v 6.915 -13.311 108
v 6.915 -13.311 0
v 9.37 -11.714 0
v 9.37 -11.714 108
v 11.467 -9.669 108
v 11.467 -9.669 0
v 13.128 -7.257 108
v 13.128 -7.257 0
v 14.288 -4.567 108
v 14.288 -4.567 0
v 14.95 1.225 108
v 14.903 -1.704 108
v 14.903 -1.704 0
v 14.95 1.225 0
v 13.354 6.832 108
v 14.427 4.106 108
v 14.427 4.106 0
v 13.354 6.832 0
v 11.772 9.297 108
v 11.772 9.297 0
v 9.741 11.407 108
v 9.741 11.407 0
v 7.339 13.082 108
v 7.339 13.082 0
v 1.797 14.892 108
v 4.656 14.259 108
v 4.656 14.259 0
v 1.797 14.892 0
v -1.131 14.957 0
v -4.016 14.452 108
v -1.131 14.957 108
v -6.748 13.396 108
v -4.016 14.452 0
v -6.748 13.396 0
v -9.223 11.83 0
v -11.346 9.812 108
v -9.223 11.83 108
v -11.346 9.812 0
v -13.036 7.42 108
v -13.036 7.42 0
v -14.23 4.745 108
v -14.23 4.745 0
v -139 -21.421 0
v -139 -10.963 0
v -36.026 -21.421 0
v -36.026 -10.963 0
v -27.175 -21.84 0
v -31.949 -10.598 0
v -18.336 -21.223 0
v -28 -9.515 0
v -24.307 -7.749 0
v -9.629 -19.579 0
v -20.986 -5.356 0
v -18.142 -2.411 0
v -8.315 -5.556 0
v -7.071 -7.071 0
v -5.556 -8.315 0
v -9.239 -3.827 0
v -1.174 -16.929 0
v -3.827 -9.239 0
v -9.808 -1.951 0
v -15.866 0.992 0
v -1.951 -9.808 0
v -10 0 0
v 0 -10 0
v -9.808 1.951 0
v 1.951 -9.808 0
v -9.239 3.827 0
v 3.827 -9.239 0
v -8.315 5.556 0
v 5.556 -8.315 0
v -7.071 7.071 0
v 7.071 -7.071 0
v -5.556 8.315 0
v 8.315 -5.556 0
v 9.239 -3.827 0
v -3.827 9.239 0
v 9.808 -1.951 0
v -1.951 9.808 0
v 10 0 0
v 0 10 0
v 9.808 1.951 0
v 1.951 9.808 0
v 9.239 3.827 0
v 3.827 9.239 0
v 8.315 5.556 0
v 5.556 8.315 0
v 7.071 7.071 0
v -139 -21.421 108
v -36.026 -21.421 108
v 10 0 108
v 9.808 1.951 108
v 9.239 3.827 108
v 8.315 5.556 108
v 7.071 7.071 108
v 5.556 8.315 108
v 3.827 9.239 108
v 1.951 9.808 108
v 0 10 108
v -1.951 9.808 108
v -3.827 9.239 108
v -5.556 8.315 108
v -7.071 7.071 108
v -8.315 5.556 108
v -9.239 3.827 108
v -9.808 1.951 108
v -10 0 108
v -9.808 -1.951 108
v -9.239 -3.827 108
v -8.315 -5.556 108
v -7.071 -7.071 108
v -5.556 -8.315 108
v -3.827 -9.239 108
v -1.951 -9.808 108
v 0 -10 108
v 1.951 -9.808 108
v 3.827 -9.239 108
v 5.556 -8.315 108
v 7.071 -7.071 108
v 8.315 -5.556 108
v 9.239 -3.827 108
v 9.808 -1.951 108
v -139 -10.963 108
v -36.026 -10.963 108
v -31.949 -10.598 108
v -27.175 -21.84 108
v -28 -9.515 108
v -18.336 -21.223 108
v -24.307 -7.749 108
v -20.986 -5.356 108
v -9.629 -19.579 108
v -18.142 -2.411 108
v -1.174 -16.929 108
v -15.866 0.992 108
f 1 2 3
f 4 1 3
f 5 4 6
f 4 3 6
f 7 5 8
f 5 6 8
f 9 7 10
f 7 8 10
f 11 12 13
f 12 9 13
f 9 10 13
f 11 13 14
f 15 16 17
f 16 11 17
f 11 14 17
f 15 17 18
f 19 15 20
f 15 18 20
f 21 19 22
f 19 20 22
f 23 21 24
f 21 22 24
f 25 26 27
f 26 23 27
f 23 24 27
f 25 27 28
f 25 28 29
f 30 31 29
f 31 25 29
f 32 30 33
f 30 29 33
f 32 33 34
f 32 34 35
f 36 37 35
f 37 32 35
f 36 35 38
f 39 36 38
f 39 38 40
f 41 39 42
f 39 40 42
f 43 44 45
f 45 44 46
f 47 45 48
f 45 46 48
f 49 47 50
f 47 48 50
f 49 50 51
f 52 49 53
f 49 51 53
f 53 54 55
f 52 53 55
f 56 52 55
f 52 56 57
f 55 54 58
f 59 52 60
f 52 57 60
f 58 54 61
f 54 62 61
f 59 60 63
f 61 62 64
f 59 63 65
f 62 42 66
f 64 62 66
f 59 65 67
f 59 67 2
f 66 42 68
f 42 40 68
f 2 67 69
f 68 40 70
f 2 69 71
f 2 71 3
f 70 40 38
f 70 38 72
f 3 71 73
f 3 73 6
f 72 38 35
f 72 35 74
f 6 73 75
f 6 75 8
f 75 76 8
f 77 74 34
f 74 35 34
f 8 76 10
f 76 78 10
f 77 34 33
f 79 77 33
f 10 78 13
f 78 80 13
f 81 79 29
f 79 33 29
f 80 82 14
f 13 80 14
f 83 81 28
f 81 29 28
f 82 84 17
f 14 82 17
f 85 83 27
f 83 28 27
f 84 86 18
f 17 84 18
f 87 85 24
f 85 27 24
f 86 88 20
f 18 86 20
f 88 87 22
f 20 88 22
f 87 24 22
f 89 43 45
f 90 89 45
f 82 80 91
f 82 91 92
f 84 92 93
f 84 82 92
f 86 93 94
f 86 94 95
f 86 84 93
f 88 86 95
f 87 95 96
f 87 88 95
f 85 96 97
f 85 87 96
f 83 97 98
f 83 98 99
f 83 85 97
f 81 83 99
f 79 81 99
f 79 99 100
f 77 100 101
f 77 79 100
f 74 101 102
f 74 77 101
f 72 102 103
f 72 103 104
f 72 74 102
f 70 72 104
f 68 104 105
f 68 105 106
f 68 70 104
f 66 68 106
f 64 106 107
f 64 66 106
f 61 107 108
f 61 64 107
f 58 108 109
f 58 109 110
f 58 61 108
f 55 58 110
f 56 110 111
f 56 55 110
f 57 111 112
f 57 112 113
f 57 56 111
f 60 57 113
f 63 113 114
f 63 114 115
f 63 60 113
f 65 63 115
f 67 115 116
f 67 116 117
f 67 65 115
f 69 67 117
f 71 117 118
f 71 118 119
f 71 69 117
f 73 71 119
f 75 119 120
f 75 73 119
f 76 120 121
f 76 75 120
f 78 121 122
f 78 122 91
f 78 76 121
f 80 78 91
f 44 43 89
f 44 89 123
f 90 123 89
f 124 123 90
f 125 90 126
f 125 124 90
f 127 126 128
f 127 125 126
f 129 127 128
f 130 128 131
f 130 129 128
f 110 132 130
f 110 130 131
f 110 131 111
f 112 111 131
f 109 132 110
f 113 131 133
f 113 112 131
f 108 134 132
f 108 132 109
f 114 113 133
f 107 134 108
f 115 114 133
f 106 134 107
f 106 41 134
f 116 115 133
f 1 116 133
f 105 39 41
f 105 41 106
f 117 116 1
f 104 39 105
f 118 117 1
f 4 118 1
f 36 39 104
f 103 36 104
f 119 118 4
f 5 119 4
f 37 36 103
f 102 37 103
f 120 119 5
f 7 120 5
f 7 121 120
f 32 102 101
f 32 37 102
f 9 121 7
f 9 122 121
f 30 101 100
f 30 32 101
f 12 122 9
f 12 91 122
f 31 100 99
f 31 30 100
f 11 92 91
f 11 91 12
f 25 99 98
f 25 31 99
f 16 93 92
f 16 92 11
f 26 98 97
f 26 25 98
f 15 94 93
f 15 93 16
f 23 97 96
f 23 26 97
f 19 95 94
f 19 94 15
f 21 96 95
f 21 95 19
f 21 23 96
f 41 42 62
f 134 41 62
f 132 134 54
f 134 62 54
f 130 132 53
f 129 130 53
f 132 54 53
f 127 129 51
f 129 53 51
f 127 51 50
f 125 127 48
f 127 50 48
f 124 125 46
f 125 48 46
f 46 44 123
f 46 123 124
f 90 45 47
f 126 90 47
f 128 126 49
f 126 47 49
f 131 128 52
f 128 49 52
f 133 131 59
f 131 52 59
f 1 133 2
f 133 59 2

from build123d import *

# Parameters (mm, degrees)
SKETCH1_W           = 102.973663886
SKETCH1_H           = 10.457969277
SKETCH1_R           = 15
SKETCH1_R_2         = 10
BOSS_EXTRUDE1_DEPTH = 108


with BuildPart() as part:
    # Sketch1 → Boss-Extrude1 (new body)
    # profile 1 of 3: a face of its own
    with BuildSketch(Plane.XY):
        with Locations((-87.513168057, -16.191787915)):
            Rectangle(SKETCH1_W, SKETCH1_H)
    # profile 2 of 3: a face of its own
    with BuildSketch(Plane.XY):
        with BuildLine():
            Line((-36.026336114, -10.962803276), (-36.026336114, -21.420772553))
            ThreePointArc((-36.026336114, -21.420772553), (-13.958524045, -20.528091864), (6.914894743, -13.311056709))
            ThreePointArc((6.914894743, -13.311056709), (-9.740834476, -11.406846352), (-14.229640926, 4.745241735))
            ThreePointArc((-14.229640926, 4.745241735), (-22.592809035, -6.626630029), (-36.026336114, -10.962803276))
        make_face()
    # profile 3 of 3: a face of its own
    with BuildSketch(Plane.XY):
        Circle(SKETCH1_R)
        Circle(SKETCH1_R_2, mode=Mode.SUBTRACT)
    extrude(amount=BOSS_EXTRUDE1_DEPTH)


solid = part.part
